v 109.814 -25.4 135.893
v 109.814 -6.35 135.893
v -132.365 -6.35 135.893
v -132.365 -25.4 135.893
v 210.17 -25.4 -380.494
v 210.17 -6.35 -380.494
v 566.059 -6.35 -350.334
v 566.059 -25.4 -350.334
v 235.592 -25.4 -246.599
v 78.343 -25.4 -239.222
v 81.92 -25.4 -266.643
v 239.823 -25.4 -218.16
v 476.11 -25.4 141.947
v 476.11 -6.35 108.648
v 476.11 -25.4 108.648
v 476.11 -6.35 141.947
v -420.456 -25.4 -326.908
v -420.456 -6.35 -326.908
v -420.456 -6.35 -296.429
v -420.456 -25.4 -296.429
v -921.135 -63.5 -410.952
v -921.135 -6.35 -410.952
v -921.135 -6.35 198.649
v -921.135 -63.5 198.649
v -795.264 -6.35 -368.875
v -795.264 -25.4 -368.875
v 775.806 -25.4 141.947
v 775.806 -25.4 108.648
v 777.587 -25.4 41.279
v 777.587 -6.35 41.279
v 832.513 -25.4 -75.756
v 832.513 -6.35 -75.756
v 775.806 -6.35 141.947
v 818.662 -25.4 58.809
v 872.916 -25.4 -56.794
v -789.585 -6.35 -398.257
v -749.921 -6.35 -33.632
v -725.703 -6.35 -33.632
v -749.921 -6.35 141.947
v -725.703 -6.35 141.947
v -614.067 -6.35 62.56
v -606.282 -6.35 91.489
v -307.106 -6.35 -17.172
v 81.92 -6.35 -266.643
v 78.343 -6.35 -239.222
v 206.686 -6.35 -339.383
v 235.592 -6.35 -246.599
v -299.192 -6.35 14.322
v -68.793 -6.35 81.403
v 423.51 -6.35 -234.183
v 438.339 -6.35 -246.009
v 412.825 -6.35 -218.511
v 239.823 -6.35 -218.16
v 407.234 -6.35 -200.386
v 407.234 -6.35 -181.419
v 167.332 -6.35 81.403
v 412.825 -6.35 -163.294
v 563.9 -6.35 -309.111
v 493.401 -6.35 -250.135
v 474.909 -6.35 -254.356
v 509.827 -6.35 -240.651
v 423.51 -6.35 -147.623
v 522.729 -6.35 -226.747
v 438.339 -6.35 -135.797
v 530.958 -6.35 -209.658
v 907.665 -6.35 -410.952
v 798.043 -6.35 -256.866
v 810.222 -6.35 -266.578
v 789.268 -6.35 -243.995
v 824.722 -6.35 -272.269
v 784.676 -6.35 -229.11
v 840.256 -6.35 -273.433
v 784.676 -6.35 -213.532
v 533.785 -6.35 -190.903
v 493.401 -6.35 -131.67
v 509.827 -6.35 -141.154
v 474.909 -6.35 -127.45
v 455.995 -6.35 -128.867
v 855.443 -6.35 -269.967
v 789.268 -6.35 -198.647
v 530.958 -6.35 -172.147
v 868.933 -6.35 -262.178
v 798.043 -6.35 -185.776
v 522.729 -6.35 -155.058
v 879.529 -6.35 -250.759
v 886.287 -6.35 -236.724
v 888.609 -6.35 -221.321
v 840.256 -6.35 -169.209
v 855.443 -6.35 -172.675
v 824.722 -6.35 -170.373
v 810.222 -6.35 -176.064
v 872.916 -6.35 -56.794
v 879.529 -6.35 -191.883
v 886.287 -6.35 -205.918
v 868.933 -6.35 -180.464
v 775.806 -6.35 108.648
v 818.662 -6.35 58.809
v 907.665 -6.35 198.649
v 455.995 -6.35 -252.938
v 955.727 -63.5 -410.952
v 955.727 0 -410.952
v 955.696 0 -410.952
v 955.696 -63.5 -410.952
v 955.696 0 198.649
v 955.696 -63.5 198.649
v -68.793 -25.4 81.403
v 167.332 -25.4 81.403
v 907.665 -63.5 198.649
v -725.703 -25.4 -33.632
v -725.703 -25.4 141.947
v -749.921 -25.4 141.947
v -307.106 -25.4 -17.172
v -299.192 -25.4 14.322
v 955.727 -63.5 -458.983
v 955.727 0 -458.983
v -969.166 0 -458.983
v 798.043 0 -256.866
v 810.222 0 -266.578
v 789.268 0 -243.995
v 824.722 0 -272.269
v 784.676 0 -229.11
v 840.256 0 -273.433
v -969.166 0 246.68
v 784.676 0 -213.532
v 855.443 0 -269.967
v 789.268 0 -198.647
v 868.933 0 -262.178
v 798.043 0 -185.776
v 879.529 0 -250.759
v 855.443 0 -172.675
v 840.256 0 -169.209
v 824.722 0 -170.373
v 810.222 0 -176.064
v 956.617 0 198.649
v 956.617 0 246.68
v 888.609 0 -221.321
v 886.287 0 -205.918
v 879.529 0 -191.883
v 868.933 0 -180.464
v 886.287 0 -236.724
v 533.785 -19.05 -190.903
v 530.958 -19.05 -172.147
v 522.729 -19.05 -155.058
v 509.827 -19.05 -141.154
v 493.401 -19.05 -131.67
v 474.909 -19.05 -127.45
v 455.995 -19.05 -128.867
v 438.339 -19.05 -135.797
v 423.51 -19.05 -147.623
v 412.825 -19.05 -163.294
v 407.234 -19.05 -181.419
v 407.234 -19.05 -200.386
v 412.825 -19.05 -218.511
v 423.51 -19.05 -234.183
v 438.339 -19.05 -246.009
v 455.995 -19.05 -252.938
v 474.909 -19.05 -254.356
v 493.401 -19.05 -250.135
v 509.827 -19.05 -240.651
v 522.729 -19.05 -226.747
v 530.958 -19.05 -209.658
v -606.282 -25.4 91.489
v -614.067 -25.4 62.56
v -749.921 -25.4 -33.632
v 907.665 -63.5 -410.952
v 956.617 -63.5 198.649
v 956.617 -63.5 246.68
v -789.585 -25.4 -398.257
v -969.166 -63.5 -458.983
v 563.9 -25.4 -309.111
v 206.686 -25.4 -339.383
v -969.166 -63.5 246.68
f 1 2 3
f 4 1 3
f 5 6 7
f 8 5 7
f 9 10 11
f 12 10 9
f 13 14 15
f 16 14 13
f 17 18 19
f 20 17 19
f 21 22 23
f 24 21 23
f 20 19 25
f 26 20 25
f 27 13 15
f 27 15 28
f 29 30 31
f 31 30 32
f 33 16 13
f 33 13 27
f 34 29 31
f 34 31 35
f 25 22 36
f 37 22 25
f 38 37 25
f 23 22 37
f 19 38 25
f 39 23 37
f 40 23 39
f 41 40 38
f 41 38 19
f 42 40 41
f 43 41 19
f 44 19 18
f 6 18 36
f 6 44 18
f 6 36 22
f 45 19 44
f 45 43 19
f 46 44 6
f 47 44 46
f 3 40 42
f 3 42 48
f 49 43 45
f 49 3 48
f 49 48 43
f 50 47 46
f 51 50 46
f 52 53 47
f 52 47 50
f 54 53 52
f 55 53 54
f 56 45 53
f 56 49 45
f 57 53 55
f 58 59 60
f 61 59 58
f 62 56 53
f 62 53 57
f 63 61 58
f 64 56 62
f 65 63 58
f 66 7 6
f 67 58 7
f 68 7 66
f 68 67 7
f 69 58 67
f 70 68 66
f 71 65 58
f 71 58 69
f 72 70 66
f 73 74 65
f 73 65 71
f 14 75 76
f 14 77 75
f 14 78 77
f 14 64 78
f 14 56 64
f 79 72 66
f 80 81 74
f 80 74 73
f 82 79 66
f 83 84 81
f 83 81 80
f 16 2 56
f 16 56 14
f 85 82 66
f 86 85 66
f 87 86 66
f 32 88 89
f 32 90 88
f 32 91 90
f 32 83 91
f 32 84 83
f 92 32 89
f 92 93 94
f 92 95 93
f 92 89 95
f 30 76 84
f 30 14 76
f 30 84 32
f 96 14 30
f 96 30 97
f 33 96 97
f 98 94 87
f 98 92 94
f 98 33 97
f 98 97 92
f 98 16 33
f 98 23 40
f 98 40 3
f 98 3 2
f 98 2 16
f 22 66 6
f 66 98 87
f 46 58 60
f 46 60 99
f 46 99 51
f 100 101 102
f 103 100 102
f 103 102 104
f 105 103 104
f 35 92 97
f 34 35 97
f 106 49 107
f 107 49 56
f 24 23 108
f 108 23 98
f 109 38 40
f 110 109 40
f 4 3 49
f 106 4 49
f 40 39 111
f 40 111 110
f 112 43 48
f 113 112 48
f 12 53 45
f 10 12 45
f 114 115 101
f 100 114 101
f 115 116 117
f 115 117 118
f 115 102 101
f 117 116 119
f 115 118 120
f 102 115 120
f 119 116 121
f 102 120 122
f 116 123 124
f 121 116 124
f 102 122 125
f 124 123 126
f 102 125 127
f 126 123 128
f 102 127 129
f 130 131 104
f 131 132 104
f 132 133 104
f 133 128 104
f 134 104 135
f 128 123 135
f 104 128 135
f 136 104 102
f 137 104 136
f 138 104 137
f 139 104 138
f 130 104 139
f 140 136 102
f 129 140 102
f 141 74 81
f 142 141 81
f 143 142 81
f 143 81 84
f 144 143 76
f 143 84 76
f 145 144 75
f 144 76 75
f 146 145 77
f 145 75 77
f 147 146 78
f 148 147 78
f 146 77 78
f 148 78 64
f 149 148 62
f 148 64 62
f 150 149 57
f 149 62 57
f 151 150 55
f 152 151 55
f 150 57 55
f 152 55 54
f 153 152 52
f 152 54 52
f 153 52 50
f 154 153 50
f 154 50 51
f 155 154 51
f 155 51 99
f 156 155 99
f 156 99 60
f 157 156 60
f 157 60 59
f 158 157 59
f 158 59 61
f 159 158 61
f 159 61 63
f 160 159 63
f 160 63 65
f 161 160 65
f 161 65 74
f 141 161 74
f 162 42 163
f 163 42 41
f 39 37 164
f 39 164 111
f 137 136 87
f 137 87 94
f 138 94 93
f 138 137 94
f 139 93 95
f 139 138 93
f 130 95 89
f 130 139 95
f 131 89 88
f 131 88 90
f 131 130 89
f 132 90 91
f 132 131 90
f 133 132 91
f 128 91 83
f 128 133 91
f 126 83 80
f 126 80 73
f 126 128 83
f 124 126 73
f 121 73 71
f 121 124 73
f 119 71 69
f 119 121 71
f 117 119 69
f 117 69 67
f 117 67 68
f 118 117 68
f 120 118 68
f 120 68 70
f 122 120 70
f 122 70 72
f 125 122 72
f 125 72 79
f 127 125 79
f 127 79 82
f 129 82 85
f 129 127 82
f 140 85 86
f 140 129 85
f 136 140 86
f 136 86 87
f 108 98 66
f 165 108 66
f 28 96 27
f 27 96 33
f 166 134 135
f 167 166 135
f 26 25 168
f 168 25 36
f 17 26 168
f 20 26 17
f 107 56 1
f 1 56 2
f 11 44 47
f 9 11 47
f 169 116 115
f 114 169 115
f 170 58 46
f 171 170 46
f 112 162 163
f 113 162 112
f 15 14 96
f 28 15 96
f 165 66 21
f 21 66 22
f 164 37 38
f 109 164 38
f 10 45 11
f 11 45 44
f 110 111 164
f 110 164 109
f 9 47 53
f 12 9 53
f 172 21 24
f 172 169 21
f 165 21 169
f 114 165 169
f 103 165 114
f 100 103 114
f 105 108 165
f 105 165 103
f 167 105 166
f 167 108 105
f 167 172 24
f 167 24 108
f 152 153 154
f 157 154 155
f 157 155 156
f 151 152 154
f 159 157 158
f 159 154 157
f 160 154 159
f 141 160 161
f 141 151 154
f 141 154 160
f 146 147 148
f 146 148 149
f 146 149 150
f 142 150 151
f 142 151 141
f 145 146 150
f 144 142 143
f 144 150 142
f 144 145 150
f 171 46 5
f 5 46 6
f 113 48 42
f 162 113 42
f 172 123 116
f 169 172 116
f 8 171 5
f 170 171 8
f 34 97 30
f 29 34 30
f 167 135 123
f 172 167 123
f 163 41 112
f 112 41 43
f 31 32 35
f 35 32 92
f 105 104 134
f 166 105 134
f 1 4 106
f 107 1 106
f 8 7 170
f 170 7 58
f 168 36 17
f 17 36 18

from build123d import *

# Parameters (mm, degrees)
F1_DEPTH = 63.5
F0_R     = 63.6308259599
F0_R_2   = 52.2581940634
F0_W     = 24.2178440094
F0_H     = 175.5797639489
F0_W_2   = 299.6964156628
F0_H_2   = 33.2996025681
F2_DEPTH = 6.35
F5_DEPTH = 25.4
F6_DEPTH = 19.05


# Not quite as in the source:
# - the program builds the solid bodies; features that only make, move or delete a surface that nothing else refers to are left out


with BuildPart() as f1:
    # F0 (on Front) → F1 (new body)
    with BuildSketch(Plane.XZ):
        Polygon((-969.1663980484, 198.6485360199), (-921.1349980484, 198.6485360199), (907.6650019516, 198.6485360199), (955.6964019516, 198.6485360199), (956.6172361374, 198.6485360199), (956.6172361374, 246.6799360199), (-969.1663980484, 246.6799360199), align=None)
        Polygon((-921.1349980484, -371.5092837811), (-921.1349980484, 198.6485360199), (-969.1663980484, 198.6485360199), (-969.1663980484, -410.9517233025), (-921.1349980484, -410.9517233025), (-921.1349980484, -410.9514639801), align=None)
        Polygon((-921.1349980484, -410.9517233025), (-969.1663980484, -410.9517233025), (-969.1663980484, -458.9831233025), (955.726981163, -458.9831233025), (955.726981163, -410.9517233025), (955.6964019516, -410.9517233025), (907.6650019516, -410.9517233025), align=None)
        Polygon((955.6964019516, 198.6485360199), (907.6650019516, 198.6485360199), (907.6650019516, -410.9514639801), (907.6650019516, -410.9517233025), (955.6964019516, -410.9517233025), align=None)
    extrude(amount=F1_DEPTH)

    # F0 (on Front) → F2 (join)
    with BuildSketch(Plane.XZ):
        Polygon((907.6650019516, 198.6485360199), (-921.1349980484, 198.6485360199), (-921.1349980484, -371.5092837811), (-921.1349980484, -410.9514639801), (-31.4717553556, -410.9514639801), (907.6650019516, -410.9514639801), align=None)
        Polygon((-789.5849161051, -398.2566583191), (-795.2640652657, -368.8750267029), (-420.4561412334, -296.4287400246), (-420.4561412334, -326.9080892764), align=None, mode=Mode.SUBTRACT)
        Polygon((210.169616585, -380.4944990589), (206.6856175661, -339.3833041191), (563.899576664, -309.1109395027), (566.059074651, -350.3343802749), align=None, mode=Mode.SUBTRACT)
        Polygon((235.5920225382, -246.5991973877), (81.9196328521, -266.643434763), (78.3429656397, -239.222336751), (239.8227507102, -218.1597428141), align=None, mode=Mode.SUBTRACT)
        with Locations((470.1542854309, -190.9026801586)):
            Circle(F0_R, mode=Mode.SUBTRACT)
        with Locations((836.3508582115, -221.3210761547)):
            Circle(F0_R_2, mode=Mode.SUBTRACT)
        with Locations((-737.8122806549, 54.1574768722)):
            Rectangle(F0_W, F0_H, mode=Mode.SUBTRACT)
        Polygon((-614.0667200089, 62.5602602959), (-606.2821745872, 91.4887040854), (-299.1916835308, 14.3223749474), (-307.1056894279, -17.1721380653), align=None, mode=Mode.SUBTRACT)
        Polygon((777.5867510857, 41.2790888272), (818.6616301537, 58.8090009987), (872.9156851768, -56.7944645882), (832.5127084301, -75.7560529142), align=None, mode=Mode.SUBTRACT)
        Polygon((-132.3649287224, 135.8928531408), (109.8140254617, 135.8928531408), (167.3315316439, 81.402592361), (-68.7929466367, 81.402592361), align=None, mode=Mode.SUBTRACT)
        with Locations((625.9579211473, 125.2975575626)):
            Rectangle(F0_W_2, F0_H_2, mode=Mode.SUBTRACT)
        Polygon((907.6650019516, -410.9517233025), (907.6650019516, -410.9514639801), (-31.4717553556, -410.9514639801), (-921.1349980484, -410.9514639801), (-921.1349980484, -410.9517233025), align=None)
    extrude(amount=F2_DEPTH)

    # F0 (on Front) → F5 (join)
    with BuildSketch(Plane.XZ):
        with Locations((625.9579211473, 125.2975575626)):
            Rectangle(F0_W_2, F0_H_2)
        Polygon((167.3315316439, 81.402592361), (109.8140254617, 135.8928531408), (-132.3649287224, 135.8928531408), (-68.7929466367, 81.402592361), align=None)
        Polygon((-299.1916835308, 14.3223749474), (-606.2821745872, 91.4887040854), (-614.0667200089, 62.5602602959), (-307.1056894279, -17.1721380653), align=None)
        Polygon((-420.4561412334, -296.4287400246), (-795.2640652657, -368.8750267029), (-789.5849161051, -398.2566583191), (-420.4561412334, -326.9080892764), align=None)
        Polygon((78.3429656397, -239.222336751), (81.9196328521, -266.643434763), (235.5920225382, -246.5991973877), (239.8227507102, -218.1597428141), align=None)
        Polygon((563.899576664, -309.1109395027), (206.6856175661, -339.3833041191), (210.169616585, -380.4944990589), (566.059074651, -350.3343802749), align=None)
        with Locations((-737.8122806549, 54.1574768722)):
            Rectangle(F0_W, F0_H)
        Polygon((872.9156851768, -56.7944645882), (818.6616301537, 58.8090009987), (777.5867510857, 41.2790888272), (832.5127084301, -75.7560529142), align=None)
    extrude(amount=F5_DEPTH)

    # F0 (on Front) → F6 (join)
    with BuildSketch(Plane.XZ):
        with Locations((470.1542854309, -190.9026801586)):
            Circle(F0_R)
    extrude(amount=F6_DEPTH)


solid = f1.part
